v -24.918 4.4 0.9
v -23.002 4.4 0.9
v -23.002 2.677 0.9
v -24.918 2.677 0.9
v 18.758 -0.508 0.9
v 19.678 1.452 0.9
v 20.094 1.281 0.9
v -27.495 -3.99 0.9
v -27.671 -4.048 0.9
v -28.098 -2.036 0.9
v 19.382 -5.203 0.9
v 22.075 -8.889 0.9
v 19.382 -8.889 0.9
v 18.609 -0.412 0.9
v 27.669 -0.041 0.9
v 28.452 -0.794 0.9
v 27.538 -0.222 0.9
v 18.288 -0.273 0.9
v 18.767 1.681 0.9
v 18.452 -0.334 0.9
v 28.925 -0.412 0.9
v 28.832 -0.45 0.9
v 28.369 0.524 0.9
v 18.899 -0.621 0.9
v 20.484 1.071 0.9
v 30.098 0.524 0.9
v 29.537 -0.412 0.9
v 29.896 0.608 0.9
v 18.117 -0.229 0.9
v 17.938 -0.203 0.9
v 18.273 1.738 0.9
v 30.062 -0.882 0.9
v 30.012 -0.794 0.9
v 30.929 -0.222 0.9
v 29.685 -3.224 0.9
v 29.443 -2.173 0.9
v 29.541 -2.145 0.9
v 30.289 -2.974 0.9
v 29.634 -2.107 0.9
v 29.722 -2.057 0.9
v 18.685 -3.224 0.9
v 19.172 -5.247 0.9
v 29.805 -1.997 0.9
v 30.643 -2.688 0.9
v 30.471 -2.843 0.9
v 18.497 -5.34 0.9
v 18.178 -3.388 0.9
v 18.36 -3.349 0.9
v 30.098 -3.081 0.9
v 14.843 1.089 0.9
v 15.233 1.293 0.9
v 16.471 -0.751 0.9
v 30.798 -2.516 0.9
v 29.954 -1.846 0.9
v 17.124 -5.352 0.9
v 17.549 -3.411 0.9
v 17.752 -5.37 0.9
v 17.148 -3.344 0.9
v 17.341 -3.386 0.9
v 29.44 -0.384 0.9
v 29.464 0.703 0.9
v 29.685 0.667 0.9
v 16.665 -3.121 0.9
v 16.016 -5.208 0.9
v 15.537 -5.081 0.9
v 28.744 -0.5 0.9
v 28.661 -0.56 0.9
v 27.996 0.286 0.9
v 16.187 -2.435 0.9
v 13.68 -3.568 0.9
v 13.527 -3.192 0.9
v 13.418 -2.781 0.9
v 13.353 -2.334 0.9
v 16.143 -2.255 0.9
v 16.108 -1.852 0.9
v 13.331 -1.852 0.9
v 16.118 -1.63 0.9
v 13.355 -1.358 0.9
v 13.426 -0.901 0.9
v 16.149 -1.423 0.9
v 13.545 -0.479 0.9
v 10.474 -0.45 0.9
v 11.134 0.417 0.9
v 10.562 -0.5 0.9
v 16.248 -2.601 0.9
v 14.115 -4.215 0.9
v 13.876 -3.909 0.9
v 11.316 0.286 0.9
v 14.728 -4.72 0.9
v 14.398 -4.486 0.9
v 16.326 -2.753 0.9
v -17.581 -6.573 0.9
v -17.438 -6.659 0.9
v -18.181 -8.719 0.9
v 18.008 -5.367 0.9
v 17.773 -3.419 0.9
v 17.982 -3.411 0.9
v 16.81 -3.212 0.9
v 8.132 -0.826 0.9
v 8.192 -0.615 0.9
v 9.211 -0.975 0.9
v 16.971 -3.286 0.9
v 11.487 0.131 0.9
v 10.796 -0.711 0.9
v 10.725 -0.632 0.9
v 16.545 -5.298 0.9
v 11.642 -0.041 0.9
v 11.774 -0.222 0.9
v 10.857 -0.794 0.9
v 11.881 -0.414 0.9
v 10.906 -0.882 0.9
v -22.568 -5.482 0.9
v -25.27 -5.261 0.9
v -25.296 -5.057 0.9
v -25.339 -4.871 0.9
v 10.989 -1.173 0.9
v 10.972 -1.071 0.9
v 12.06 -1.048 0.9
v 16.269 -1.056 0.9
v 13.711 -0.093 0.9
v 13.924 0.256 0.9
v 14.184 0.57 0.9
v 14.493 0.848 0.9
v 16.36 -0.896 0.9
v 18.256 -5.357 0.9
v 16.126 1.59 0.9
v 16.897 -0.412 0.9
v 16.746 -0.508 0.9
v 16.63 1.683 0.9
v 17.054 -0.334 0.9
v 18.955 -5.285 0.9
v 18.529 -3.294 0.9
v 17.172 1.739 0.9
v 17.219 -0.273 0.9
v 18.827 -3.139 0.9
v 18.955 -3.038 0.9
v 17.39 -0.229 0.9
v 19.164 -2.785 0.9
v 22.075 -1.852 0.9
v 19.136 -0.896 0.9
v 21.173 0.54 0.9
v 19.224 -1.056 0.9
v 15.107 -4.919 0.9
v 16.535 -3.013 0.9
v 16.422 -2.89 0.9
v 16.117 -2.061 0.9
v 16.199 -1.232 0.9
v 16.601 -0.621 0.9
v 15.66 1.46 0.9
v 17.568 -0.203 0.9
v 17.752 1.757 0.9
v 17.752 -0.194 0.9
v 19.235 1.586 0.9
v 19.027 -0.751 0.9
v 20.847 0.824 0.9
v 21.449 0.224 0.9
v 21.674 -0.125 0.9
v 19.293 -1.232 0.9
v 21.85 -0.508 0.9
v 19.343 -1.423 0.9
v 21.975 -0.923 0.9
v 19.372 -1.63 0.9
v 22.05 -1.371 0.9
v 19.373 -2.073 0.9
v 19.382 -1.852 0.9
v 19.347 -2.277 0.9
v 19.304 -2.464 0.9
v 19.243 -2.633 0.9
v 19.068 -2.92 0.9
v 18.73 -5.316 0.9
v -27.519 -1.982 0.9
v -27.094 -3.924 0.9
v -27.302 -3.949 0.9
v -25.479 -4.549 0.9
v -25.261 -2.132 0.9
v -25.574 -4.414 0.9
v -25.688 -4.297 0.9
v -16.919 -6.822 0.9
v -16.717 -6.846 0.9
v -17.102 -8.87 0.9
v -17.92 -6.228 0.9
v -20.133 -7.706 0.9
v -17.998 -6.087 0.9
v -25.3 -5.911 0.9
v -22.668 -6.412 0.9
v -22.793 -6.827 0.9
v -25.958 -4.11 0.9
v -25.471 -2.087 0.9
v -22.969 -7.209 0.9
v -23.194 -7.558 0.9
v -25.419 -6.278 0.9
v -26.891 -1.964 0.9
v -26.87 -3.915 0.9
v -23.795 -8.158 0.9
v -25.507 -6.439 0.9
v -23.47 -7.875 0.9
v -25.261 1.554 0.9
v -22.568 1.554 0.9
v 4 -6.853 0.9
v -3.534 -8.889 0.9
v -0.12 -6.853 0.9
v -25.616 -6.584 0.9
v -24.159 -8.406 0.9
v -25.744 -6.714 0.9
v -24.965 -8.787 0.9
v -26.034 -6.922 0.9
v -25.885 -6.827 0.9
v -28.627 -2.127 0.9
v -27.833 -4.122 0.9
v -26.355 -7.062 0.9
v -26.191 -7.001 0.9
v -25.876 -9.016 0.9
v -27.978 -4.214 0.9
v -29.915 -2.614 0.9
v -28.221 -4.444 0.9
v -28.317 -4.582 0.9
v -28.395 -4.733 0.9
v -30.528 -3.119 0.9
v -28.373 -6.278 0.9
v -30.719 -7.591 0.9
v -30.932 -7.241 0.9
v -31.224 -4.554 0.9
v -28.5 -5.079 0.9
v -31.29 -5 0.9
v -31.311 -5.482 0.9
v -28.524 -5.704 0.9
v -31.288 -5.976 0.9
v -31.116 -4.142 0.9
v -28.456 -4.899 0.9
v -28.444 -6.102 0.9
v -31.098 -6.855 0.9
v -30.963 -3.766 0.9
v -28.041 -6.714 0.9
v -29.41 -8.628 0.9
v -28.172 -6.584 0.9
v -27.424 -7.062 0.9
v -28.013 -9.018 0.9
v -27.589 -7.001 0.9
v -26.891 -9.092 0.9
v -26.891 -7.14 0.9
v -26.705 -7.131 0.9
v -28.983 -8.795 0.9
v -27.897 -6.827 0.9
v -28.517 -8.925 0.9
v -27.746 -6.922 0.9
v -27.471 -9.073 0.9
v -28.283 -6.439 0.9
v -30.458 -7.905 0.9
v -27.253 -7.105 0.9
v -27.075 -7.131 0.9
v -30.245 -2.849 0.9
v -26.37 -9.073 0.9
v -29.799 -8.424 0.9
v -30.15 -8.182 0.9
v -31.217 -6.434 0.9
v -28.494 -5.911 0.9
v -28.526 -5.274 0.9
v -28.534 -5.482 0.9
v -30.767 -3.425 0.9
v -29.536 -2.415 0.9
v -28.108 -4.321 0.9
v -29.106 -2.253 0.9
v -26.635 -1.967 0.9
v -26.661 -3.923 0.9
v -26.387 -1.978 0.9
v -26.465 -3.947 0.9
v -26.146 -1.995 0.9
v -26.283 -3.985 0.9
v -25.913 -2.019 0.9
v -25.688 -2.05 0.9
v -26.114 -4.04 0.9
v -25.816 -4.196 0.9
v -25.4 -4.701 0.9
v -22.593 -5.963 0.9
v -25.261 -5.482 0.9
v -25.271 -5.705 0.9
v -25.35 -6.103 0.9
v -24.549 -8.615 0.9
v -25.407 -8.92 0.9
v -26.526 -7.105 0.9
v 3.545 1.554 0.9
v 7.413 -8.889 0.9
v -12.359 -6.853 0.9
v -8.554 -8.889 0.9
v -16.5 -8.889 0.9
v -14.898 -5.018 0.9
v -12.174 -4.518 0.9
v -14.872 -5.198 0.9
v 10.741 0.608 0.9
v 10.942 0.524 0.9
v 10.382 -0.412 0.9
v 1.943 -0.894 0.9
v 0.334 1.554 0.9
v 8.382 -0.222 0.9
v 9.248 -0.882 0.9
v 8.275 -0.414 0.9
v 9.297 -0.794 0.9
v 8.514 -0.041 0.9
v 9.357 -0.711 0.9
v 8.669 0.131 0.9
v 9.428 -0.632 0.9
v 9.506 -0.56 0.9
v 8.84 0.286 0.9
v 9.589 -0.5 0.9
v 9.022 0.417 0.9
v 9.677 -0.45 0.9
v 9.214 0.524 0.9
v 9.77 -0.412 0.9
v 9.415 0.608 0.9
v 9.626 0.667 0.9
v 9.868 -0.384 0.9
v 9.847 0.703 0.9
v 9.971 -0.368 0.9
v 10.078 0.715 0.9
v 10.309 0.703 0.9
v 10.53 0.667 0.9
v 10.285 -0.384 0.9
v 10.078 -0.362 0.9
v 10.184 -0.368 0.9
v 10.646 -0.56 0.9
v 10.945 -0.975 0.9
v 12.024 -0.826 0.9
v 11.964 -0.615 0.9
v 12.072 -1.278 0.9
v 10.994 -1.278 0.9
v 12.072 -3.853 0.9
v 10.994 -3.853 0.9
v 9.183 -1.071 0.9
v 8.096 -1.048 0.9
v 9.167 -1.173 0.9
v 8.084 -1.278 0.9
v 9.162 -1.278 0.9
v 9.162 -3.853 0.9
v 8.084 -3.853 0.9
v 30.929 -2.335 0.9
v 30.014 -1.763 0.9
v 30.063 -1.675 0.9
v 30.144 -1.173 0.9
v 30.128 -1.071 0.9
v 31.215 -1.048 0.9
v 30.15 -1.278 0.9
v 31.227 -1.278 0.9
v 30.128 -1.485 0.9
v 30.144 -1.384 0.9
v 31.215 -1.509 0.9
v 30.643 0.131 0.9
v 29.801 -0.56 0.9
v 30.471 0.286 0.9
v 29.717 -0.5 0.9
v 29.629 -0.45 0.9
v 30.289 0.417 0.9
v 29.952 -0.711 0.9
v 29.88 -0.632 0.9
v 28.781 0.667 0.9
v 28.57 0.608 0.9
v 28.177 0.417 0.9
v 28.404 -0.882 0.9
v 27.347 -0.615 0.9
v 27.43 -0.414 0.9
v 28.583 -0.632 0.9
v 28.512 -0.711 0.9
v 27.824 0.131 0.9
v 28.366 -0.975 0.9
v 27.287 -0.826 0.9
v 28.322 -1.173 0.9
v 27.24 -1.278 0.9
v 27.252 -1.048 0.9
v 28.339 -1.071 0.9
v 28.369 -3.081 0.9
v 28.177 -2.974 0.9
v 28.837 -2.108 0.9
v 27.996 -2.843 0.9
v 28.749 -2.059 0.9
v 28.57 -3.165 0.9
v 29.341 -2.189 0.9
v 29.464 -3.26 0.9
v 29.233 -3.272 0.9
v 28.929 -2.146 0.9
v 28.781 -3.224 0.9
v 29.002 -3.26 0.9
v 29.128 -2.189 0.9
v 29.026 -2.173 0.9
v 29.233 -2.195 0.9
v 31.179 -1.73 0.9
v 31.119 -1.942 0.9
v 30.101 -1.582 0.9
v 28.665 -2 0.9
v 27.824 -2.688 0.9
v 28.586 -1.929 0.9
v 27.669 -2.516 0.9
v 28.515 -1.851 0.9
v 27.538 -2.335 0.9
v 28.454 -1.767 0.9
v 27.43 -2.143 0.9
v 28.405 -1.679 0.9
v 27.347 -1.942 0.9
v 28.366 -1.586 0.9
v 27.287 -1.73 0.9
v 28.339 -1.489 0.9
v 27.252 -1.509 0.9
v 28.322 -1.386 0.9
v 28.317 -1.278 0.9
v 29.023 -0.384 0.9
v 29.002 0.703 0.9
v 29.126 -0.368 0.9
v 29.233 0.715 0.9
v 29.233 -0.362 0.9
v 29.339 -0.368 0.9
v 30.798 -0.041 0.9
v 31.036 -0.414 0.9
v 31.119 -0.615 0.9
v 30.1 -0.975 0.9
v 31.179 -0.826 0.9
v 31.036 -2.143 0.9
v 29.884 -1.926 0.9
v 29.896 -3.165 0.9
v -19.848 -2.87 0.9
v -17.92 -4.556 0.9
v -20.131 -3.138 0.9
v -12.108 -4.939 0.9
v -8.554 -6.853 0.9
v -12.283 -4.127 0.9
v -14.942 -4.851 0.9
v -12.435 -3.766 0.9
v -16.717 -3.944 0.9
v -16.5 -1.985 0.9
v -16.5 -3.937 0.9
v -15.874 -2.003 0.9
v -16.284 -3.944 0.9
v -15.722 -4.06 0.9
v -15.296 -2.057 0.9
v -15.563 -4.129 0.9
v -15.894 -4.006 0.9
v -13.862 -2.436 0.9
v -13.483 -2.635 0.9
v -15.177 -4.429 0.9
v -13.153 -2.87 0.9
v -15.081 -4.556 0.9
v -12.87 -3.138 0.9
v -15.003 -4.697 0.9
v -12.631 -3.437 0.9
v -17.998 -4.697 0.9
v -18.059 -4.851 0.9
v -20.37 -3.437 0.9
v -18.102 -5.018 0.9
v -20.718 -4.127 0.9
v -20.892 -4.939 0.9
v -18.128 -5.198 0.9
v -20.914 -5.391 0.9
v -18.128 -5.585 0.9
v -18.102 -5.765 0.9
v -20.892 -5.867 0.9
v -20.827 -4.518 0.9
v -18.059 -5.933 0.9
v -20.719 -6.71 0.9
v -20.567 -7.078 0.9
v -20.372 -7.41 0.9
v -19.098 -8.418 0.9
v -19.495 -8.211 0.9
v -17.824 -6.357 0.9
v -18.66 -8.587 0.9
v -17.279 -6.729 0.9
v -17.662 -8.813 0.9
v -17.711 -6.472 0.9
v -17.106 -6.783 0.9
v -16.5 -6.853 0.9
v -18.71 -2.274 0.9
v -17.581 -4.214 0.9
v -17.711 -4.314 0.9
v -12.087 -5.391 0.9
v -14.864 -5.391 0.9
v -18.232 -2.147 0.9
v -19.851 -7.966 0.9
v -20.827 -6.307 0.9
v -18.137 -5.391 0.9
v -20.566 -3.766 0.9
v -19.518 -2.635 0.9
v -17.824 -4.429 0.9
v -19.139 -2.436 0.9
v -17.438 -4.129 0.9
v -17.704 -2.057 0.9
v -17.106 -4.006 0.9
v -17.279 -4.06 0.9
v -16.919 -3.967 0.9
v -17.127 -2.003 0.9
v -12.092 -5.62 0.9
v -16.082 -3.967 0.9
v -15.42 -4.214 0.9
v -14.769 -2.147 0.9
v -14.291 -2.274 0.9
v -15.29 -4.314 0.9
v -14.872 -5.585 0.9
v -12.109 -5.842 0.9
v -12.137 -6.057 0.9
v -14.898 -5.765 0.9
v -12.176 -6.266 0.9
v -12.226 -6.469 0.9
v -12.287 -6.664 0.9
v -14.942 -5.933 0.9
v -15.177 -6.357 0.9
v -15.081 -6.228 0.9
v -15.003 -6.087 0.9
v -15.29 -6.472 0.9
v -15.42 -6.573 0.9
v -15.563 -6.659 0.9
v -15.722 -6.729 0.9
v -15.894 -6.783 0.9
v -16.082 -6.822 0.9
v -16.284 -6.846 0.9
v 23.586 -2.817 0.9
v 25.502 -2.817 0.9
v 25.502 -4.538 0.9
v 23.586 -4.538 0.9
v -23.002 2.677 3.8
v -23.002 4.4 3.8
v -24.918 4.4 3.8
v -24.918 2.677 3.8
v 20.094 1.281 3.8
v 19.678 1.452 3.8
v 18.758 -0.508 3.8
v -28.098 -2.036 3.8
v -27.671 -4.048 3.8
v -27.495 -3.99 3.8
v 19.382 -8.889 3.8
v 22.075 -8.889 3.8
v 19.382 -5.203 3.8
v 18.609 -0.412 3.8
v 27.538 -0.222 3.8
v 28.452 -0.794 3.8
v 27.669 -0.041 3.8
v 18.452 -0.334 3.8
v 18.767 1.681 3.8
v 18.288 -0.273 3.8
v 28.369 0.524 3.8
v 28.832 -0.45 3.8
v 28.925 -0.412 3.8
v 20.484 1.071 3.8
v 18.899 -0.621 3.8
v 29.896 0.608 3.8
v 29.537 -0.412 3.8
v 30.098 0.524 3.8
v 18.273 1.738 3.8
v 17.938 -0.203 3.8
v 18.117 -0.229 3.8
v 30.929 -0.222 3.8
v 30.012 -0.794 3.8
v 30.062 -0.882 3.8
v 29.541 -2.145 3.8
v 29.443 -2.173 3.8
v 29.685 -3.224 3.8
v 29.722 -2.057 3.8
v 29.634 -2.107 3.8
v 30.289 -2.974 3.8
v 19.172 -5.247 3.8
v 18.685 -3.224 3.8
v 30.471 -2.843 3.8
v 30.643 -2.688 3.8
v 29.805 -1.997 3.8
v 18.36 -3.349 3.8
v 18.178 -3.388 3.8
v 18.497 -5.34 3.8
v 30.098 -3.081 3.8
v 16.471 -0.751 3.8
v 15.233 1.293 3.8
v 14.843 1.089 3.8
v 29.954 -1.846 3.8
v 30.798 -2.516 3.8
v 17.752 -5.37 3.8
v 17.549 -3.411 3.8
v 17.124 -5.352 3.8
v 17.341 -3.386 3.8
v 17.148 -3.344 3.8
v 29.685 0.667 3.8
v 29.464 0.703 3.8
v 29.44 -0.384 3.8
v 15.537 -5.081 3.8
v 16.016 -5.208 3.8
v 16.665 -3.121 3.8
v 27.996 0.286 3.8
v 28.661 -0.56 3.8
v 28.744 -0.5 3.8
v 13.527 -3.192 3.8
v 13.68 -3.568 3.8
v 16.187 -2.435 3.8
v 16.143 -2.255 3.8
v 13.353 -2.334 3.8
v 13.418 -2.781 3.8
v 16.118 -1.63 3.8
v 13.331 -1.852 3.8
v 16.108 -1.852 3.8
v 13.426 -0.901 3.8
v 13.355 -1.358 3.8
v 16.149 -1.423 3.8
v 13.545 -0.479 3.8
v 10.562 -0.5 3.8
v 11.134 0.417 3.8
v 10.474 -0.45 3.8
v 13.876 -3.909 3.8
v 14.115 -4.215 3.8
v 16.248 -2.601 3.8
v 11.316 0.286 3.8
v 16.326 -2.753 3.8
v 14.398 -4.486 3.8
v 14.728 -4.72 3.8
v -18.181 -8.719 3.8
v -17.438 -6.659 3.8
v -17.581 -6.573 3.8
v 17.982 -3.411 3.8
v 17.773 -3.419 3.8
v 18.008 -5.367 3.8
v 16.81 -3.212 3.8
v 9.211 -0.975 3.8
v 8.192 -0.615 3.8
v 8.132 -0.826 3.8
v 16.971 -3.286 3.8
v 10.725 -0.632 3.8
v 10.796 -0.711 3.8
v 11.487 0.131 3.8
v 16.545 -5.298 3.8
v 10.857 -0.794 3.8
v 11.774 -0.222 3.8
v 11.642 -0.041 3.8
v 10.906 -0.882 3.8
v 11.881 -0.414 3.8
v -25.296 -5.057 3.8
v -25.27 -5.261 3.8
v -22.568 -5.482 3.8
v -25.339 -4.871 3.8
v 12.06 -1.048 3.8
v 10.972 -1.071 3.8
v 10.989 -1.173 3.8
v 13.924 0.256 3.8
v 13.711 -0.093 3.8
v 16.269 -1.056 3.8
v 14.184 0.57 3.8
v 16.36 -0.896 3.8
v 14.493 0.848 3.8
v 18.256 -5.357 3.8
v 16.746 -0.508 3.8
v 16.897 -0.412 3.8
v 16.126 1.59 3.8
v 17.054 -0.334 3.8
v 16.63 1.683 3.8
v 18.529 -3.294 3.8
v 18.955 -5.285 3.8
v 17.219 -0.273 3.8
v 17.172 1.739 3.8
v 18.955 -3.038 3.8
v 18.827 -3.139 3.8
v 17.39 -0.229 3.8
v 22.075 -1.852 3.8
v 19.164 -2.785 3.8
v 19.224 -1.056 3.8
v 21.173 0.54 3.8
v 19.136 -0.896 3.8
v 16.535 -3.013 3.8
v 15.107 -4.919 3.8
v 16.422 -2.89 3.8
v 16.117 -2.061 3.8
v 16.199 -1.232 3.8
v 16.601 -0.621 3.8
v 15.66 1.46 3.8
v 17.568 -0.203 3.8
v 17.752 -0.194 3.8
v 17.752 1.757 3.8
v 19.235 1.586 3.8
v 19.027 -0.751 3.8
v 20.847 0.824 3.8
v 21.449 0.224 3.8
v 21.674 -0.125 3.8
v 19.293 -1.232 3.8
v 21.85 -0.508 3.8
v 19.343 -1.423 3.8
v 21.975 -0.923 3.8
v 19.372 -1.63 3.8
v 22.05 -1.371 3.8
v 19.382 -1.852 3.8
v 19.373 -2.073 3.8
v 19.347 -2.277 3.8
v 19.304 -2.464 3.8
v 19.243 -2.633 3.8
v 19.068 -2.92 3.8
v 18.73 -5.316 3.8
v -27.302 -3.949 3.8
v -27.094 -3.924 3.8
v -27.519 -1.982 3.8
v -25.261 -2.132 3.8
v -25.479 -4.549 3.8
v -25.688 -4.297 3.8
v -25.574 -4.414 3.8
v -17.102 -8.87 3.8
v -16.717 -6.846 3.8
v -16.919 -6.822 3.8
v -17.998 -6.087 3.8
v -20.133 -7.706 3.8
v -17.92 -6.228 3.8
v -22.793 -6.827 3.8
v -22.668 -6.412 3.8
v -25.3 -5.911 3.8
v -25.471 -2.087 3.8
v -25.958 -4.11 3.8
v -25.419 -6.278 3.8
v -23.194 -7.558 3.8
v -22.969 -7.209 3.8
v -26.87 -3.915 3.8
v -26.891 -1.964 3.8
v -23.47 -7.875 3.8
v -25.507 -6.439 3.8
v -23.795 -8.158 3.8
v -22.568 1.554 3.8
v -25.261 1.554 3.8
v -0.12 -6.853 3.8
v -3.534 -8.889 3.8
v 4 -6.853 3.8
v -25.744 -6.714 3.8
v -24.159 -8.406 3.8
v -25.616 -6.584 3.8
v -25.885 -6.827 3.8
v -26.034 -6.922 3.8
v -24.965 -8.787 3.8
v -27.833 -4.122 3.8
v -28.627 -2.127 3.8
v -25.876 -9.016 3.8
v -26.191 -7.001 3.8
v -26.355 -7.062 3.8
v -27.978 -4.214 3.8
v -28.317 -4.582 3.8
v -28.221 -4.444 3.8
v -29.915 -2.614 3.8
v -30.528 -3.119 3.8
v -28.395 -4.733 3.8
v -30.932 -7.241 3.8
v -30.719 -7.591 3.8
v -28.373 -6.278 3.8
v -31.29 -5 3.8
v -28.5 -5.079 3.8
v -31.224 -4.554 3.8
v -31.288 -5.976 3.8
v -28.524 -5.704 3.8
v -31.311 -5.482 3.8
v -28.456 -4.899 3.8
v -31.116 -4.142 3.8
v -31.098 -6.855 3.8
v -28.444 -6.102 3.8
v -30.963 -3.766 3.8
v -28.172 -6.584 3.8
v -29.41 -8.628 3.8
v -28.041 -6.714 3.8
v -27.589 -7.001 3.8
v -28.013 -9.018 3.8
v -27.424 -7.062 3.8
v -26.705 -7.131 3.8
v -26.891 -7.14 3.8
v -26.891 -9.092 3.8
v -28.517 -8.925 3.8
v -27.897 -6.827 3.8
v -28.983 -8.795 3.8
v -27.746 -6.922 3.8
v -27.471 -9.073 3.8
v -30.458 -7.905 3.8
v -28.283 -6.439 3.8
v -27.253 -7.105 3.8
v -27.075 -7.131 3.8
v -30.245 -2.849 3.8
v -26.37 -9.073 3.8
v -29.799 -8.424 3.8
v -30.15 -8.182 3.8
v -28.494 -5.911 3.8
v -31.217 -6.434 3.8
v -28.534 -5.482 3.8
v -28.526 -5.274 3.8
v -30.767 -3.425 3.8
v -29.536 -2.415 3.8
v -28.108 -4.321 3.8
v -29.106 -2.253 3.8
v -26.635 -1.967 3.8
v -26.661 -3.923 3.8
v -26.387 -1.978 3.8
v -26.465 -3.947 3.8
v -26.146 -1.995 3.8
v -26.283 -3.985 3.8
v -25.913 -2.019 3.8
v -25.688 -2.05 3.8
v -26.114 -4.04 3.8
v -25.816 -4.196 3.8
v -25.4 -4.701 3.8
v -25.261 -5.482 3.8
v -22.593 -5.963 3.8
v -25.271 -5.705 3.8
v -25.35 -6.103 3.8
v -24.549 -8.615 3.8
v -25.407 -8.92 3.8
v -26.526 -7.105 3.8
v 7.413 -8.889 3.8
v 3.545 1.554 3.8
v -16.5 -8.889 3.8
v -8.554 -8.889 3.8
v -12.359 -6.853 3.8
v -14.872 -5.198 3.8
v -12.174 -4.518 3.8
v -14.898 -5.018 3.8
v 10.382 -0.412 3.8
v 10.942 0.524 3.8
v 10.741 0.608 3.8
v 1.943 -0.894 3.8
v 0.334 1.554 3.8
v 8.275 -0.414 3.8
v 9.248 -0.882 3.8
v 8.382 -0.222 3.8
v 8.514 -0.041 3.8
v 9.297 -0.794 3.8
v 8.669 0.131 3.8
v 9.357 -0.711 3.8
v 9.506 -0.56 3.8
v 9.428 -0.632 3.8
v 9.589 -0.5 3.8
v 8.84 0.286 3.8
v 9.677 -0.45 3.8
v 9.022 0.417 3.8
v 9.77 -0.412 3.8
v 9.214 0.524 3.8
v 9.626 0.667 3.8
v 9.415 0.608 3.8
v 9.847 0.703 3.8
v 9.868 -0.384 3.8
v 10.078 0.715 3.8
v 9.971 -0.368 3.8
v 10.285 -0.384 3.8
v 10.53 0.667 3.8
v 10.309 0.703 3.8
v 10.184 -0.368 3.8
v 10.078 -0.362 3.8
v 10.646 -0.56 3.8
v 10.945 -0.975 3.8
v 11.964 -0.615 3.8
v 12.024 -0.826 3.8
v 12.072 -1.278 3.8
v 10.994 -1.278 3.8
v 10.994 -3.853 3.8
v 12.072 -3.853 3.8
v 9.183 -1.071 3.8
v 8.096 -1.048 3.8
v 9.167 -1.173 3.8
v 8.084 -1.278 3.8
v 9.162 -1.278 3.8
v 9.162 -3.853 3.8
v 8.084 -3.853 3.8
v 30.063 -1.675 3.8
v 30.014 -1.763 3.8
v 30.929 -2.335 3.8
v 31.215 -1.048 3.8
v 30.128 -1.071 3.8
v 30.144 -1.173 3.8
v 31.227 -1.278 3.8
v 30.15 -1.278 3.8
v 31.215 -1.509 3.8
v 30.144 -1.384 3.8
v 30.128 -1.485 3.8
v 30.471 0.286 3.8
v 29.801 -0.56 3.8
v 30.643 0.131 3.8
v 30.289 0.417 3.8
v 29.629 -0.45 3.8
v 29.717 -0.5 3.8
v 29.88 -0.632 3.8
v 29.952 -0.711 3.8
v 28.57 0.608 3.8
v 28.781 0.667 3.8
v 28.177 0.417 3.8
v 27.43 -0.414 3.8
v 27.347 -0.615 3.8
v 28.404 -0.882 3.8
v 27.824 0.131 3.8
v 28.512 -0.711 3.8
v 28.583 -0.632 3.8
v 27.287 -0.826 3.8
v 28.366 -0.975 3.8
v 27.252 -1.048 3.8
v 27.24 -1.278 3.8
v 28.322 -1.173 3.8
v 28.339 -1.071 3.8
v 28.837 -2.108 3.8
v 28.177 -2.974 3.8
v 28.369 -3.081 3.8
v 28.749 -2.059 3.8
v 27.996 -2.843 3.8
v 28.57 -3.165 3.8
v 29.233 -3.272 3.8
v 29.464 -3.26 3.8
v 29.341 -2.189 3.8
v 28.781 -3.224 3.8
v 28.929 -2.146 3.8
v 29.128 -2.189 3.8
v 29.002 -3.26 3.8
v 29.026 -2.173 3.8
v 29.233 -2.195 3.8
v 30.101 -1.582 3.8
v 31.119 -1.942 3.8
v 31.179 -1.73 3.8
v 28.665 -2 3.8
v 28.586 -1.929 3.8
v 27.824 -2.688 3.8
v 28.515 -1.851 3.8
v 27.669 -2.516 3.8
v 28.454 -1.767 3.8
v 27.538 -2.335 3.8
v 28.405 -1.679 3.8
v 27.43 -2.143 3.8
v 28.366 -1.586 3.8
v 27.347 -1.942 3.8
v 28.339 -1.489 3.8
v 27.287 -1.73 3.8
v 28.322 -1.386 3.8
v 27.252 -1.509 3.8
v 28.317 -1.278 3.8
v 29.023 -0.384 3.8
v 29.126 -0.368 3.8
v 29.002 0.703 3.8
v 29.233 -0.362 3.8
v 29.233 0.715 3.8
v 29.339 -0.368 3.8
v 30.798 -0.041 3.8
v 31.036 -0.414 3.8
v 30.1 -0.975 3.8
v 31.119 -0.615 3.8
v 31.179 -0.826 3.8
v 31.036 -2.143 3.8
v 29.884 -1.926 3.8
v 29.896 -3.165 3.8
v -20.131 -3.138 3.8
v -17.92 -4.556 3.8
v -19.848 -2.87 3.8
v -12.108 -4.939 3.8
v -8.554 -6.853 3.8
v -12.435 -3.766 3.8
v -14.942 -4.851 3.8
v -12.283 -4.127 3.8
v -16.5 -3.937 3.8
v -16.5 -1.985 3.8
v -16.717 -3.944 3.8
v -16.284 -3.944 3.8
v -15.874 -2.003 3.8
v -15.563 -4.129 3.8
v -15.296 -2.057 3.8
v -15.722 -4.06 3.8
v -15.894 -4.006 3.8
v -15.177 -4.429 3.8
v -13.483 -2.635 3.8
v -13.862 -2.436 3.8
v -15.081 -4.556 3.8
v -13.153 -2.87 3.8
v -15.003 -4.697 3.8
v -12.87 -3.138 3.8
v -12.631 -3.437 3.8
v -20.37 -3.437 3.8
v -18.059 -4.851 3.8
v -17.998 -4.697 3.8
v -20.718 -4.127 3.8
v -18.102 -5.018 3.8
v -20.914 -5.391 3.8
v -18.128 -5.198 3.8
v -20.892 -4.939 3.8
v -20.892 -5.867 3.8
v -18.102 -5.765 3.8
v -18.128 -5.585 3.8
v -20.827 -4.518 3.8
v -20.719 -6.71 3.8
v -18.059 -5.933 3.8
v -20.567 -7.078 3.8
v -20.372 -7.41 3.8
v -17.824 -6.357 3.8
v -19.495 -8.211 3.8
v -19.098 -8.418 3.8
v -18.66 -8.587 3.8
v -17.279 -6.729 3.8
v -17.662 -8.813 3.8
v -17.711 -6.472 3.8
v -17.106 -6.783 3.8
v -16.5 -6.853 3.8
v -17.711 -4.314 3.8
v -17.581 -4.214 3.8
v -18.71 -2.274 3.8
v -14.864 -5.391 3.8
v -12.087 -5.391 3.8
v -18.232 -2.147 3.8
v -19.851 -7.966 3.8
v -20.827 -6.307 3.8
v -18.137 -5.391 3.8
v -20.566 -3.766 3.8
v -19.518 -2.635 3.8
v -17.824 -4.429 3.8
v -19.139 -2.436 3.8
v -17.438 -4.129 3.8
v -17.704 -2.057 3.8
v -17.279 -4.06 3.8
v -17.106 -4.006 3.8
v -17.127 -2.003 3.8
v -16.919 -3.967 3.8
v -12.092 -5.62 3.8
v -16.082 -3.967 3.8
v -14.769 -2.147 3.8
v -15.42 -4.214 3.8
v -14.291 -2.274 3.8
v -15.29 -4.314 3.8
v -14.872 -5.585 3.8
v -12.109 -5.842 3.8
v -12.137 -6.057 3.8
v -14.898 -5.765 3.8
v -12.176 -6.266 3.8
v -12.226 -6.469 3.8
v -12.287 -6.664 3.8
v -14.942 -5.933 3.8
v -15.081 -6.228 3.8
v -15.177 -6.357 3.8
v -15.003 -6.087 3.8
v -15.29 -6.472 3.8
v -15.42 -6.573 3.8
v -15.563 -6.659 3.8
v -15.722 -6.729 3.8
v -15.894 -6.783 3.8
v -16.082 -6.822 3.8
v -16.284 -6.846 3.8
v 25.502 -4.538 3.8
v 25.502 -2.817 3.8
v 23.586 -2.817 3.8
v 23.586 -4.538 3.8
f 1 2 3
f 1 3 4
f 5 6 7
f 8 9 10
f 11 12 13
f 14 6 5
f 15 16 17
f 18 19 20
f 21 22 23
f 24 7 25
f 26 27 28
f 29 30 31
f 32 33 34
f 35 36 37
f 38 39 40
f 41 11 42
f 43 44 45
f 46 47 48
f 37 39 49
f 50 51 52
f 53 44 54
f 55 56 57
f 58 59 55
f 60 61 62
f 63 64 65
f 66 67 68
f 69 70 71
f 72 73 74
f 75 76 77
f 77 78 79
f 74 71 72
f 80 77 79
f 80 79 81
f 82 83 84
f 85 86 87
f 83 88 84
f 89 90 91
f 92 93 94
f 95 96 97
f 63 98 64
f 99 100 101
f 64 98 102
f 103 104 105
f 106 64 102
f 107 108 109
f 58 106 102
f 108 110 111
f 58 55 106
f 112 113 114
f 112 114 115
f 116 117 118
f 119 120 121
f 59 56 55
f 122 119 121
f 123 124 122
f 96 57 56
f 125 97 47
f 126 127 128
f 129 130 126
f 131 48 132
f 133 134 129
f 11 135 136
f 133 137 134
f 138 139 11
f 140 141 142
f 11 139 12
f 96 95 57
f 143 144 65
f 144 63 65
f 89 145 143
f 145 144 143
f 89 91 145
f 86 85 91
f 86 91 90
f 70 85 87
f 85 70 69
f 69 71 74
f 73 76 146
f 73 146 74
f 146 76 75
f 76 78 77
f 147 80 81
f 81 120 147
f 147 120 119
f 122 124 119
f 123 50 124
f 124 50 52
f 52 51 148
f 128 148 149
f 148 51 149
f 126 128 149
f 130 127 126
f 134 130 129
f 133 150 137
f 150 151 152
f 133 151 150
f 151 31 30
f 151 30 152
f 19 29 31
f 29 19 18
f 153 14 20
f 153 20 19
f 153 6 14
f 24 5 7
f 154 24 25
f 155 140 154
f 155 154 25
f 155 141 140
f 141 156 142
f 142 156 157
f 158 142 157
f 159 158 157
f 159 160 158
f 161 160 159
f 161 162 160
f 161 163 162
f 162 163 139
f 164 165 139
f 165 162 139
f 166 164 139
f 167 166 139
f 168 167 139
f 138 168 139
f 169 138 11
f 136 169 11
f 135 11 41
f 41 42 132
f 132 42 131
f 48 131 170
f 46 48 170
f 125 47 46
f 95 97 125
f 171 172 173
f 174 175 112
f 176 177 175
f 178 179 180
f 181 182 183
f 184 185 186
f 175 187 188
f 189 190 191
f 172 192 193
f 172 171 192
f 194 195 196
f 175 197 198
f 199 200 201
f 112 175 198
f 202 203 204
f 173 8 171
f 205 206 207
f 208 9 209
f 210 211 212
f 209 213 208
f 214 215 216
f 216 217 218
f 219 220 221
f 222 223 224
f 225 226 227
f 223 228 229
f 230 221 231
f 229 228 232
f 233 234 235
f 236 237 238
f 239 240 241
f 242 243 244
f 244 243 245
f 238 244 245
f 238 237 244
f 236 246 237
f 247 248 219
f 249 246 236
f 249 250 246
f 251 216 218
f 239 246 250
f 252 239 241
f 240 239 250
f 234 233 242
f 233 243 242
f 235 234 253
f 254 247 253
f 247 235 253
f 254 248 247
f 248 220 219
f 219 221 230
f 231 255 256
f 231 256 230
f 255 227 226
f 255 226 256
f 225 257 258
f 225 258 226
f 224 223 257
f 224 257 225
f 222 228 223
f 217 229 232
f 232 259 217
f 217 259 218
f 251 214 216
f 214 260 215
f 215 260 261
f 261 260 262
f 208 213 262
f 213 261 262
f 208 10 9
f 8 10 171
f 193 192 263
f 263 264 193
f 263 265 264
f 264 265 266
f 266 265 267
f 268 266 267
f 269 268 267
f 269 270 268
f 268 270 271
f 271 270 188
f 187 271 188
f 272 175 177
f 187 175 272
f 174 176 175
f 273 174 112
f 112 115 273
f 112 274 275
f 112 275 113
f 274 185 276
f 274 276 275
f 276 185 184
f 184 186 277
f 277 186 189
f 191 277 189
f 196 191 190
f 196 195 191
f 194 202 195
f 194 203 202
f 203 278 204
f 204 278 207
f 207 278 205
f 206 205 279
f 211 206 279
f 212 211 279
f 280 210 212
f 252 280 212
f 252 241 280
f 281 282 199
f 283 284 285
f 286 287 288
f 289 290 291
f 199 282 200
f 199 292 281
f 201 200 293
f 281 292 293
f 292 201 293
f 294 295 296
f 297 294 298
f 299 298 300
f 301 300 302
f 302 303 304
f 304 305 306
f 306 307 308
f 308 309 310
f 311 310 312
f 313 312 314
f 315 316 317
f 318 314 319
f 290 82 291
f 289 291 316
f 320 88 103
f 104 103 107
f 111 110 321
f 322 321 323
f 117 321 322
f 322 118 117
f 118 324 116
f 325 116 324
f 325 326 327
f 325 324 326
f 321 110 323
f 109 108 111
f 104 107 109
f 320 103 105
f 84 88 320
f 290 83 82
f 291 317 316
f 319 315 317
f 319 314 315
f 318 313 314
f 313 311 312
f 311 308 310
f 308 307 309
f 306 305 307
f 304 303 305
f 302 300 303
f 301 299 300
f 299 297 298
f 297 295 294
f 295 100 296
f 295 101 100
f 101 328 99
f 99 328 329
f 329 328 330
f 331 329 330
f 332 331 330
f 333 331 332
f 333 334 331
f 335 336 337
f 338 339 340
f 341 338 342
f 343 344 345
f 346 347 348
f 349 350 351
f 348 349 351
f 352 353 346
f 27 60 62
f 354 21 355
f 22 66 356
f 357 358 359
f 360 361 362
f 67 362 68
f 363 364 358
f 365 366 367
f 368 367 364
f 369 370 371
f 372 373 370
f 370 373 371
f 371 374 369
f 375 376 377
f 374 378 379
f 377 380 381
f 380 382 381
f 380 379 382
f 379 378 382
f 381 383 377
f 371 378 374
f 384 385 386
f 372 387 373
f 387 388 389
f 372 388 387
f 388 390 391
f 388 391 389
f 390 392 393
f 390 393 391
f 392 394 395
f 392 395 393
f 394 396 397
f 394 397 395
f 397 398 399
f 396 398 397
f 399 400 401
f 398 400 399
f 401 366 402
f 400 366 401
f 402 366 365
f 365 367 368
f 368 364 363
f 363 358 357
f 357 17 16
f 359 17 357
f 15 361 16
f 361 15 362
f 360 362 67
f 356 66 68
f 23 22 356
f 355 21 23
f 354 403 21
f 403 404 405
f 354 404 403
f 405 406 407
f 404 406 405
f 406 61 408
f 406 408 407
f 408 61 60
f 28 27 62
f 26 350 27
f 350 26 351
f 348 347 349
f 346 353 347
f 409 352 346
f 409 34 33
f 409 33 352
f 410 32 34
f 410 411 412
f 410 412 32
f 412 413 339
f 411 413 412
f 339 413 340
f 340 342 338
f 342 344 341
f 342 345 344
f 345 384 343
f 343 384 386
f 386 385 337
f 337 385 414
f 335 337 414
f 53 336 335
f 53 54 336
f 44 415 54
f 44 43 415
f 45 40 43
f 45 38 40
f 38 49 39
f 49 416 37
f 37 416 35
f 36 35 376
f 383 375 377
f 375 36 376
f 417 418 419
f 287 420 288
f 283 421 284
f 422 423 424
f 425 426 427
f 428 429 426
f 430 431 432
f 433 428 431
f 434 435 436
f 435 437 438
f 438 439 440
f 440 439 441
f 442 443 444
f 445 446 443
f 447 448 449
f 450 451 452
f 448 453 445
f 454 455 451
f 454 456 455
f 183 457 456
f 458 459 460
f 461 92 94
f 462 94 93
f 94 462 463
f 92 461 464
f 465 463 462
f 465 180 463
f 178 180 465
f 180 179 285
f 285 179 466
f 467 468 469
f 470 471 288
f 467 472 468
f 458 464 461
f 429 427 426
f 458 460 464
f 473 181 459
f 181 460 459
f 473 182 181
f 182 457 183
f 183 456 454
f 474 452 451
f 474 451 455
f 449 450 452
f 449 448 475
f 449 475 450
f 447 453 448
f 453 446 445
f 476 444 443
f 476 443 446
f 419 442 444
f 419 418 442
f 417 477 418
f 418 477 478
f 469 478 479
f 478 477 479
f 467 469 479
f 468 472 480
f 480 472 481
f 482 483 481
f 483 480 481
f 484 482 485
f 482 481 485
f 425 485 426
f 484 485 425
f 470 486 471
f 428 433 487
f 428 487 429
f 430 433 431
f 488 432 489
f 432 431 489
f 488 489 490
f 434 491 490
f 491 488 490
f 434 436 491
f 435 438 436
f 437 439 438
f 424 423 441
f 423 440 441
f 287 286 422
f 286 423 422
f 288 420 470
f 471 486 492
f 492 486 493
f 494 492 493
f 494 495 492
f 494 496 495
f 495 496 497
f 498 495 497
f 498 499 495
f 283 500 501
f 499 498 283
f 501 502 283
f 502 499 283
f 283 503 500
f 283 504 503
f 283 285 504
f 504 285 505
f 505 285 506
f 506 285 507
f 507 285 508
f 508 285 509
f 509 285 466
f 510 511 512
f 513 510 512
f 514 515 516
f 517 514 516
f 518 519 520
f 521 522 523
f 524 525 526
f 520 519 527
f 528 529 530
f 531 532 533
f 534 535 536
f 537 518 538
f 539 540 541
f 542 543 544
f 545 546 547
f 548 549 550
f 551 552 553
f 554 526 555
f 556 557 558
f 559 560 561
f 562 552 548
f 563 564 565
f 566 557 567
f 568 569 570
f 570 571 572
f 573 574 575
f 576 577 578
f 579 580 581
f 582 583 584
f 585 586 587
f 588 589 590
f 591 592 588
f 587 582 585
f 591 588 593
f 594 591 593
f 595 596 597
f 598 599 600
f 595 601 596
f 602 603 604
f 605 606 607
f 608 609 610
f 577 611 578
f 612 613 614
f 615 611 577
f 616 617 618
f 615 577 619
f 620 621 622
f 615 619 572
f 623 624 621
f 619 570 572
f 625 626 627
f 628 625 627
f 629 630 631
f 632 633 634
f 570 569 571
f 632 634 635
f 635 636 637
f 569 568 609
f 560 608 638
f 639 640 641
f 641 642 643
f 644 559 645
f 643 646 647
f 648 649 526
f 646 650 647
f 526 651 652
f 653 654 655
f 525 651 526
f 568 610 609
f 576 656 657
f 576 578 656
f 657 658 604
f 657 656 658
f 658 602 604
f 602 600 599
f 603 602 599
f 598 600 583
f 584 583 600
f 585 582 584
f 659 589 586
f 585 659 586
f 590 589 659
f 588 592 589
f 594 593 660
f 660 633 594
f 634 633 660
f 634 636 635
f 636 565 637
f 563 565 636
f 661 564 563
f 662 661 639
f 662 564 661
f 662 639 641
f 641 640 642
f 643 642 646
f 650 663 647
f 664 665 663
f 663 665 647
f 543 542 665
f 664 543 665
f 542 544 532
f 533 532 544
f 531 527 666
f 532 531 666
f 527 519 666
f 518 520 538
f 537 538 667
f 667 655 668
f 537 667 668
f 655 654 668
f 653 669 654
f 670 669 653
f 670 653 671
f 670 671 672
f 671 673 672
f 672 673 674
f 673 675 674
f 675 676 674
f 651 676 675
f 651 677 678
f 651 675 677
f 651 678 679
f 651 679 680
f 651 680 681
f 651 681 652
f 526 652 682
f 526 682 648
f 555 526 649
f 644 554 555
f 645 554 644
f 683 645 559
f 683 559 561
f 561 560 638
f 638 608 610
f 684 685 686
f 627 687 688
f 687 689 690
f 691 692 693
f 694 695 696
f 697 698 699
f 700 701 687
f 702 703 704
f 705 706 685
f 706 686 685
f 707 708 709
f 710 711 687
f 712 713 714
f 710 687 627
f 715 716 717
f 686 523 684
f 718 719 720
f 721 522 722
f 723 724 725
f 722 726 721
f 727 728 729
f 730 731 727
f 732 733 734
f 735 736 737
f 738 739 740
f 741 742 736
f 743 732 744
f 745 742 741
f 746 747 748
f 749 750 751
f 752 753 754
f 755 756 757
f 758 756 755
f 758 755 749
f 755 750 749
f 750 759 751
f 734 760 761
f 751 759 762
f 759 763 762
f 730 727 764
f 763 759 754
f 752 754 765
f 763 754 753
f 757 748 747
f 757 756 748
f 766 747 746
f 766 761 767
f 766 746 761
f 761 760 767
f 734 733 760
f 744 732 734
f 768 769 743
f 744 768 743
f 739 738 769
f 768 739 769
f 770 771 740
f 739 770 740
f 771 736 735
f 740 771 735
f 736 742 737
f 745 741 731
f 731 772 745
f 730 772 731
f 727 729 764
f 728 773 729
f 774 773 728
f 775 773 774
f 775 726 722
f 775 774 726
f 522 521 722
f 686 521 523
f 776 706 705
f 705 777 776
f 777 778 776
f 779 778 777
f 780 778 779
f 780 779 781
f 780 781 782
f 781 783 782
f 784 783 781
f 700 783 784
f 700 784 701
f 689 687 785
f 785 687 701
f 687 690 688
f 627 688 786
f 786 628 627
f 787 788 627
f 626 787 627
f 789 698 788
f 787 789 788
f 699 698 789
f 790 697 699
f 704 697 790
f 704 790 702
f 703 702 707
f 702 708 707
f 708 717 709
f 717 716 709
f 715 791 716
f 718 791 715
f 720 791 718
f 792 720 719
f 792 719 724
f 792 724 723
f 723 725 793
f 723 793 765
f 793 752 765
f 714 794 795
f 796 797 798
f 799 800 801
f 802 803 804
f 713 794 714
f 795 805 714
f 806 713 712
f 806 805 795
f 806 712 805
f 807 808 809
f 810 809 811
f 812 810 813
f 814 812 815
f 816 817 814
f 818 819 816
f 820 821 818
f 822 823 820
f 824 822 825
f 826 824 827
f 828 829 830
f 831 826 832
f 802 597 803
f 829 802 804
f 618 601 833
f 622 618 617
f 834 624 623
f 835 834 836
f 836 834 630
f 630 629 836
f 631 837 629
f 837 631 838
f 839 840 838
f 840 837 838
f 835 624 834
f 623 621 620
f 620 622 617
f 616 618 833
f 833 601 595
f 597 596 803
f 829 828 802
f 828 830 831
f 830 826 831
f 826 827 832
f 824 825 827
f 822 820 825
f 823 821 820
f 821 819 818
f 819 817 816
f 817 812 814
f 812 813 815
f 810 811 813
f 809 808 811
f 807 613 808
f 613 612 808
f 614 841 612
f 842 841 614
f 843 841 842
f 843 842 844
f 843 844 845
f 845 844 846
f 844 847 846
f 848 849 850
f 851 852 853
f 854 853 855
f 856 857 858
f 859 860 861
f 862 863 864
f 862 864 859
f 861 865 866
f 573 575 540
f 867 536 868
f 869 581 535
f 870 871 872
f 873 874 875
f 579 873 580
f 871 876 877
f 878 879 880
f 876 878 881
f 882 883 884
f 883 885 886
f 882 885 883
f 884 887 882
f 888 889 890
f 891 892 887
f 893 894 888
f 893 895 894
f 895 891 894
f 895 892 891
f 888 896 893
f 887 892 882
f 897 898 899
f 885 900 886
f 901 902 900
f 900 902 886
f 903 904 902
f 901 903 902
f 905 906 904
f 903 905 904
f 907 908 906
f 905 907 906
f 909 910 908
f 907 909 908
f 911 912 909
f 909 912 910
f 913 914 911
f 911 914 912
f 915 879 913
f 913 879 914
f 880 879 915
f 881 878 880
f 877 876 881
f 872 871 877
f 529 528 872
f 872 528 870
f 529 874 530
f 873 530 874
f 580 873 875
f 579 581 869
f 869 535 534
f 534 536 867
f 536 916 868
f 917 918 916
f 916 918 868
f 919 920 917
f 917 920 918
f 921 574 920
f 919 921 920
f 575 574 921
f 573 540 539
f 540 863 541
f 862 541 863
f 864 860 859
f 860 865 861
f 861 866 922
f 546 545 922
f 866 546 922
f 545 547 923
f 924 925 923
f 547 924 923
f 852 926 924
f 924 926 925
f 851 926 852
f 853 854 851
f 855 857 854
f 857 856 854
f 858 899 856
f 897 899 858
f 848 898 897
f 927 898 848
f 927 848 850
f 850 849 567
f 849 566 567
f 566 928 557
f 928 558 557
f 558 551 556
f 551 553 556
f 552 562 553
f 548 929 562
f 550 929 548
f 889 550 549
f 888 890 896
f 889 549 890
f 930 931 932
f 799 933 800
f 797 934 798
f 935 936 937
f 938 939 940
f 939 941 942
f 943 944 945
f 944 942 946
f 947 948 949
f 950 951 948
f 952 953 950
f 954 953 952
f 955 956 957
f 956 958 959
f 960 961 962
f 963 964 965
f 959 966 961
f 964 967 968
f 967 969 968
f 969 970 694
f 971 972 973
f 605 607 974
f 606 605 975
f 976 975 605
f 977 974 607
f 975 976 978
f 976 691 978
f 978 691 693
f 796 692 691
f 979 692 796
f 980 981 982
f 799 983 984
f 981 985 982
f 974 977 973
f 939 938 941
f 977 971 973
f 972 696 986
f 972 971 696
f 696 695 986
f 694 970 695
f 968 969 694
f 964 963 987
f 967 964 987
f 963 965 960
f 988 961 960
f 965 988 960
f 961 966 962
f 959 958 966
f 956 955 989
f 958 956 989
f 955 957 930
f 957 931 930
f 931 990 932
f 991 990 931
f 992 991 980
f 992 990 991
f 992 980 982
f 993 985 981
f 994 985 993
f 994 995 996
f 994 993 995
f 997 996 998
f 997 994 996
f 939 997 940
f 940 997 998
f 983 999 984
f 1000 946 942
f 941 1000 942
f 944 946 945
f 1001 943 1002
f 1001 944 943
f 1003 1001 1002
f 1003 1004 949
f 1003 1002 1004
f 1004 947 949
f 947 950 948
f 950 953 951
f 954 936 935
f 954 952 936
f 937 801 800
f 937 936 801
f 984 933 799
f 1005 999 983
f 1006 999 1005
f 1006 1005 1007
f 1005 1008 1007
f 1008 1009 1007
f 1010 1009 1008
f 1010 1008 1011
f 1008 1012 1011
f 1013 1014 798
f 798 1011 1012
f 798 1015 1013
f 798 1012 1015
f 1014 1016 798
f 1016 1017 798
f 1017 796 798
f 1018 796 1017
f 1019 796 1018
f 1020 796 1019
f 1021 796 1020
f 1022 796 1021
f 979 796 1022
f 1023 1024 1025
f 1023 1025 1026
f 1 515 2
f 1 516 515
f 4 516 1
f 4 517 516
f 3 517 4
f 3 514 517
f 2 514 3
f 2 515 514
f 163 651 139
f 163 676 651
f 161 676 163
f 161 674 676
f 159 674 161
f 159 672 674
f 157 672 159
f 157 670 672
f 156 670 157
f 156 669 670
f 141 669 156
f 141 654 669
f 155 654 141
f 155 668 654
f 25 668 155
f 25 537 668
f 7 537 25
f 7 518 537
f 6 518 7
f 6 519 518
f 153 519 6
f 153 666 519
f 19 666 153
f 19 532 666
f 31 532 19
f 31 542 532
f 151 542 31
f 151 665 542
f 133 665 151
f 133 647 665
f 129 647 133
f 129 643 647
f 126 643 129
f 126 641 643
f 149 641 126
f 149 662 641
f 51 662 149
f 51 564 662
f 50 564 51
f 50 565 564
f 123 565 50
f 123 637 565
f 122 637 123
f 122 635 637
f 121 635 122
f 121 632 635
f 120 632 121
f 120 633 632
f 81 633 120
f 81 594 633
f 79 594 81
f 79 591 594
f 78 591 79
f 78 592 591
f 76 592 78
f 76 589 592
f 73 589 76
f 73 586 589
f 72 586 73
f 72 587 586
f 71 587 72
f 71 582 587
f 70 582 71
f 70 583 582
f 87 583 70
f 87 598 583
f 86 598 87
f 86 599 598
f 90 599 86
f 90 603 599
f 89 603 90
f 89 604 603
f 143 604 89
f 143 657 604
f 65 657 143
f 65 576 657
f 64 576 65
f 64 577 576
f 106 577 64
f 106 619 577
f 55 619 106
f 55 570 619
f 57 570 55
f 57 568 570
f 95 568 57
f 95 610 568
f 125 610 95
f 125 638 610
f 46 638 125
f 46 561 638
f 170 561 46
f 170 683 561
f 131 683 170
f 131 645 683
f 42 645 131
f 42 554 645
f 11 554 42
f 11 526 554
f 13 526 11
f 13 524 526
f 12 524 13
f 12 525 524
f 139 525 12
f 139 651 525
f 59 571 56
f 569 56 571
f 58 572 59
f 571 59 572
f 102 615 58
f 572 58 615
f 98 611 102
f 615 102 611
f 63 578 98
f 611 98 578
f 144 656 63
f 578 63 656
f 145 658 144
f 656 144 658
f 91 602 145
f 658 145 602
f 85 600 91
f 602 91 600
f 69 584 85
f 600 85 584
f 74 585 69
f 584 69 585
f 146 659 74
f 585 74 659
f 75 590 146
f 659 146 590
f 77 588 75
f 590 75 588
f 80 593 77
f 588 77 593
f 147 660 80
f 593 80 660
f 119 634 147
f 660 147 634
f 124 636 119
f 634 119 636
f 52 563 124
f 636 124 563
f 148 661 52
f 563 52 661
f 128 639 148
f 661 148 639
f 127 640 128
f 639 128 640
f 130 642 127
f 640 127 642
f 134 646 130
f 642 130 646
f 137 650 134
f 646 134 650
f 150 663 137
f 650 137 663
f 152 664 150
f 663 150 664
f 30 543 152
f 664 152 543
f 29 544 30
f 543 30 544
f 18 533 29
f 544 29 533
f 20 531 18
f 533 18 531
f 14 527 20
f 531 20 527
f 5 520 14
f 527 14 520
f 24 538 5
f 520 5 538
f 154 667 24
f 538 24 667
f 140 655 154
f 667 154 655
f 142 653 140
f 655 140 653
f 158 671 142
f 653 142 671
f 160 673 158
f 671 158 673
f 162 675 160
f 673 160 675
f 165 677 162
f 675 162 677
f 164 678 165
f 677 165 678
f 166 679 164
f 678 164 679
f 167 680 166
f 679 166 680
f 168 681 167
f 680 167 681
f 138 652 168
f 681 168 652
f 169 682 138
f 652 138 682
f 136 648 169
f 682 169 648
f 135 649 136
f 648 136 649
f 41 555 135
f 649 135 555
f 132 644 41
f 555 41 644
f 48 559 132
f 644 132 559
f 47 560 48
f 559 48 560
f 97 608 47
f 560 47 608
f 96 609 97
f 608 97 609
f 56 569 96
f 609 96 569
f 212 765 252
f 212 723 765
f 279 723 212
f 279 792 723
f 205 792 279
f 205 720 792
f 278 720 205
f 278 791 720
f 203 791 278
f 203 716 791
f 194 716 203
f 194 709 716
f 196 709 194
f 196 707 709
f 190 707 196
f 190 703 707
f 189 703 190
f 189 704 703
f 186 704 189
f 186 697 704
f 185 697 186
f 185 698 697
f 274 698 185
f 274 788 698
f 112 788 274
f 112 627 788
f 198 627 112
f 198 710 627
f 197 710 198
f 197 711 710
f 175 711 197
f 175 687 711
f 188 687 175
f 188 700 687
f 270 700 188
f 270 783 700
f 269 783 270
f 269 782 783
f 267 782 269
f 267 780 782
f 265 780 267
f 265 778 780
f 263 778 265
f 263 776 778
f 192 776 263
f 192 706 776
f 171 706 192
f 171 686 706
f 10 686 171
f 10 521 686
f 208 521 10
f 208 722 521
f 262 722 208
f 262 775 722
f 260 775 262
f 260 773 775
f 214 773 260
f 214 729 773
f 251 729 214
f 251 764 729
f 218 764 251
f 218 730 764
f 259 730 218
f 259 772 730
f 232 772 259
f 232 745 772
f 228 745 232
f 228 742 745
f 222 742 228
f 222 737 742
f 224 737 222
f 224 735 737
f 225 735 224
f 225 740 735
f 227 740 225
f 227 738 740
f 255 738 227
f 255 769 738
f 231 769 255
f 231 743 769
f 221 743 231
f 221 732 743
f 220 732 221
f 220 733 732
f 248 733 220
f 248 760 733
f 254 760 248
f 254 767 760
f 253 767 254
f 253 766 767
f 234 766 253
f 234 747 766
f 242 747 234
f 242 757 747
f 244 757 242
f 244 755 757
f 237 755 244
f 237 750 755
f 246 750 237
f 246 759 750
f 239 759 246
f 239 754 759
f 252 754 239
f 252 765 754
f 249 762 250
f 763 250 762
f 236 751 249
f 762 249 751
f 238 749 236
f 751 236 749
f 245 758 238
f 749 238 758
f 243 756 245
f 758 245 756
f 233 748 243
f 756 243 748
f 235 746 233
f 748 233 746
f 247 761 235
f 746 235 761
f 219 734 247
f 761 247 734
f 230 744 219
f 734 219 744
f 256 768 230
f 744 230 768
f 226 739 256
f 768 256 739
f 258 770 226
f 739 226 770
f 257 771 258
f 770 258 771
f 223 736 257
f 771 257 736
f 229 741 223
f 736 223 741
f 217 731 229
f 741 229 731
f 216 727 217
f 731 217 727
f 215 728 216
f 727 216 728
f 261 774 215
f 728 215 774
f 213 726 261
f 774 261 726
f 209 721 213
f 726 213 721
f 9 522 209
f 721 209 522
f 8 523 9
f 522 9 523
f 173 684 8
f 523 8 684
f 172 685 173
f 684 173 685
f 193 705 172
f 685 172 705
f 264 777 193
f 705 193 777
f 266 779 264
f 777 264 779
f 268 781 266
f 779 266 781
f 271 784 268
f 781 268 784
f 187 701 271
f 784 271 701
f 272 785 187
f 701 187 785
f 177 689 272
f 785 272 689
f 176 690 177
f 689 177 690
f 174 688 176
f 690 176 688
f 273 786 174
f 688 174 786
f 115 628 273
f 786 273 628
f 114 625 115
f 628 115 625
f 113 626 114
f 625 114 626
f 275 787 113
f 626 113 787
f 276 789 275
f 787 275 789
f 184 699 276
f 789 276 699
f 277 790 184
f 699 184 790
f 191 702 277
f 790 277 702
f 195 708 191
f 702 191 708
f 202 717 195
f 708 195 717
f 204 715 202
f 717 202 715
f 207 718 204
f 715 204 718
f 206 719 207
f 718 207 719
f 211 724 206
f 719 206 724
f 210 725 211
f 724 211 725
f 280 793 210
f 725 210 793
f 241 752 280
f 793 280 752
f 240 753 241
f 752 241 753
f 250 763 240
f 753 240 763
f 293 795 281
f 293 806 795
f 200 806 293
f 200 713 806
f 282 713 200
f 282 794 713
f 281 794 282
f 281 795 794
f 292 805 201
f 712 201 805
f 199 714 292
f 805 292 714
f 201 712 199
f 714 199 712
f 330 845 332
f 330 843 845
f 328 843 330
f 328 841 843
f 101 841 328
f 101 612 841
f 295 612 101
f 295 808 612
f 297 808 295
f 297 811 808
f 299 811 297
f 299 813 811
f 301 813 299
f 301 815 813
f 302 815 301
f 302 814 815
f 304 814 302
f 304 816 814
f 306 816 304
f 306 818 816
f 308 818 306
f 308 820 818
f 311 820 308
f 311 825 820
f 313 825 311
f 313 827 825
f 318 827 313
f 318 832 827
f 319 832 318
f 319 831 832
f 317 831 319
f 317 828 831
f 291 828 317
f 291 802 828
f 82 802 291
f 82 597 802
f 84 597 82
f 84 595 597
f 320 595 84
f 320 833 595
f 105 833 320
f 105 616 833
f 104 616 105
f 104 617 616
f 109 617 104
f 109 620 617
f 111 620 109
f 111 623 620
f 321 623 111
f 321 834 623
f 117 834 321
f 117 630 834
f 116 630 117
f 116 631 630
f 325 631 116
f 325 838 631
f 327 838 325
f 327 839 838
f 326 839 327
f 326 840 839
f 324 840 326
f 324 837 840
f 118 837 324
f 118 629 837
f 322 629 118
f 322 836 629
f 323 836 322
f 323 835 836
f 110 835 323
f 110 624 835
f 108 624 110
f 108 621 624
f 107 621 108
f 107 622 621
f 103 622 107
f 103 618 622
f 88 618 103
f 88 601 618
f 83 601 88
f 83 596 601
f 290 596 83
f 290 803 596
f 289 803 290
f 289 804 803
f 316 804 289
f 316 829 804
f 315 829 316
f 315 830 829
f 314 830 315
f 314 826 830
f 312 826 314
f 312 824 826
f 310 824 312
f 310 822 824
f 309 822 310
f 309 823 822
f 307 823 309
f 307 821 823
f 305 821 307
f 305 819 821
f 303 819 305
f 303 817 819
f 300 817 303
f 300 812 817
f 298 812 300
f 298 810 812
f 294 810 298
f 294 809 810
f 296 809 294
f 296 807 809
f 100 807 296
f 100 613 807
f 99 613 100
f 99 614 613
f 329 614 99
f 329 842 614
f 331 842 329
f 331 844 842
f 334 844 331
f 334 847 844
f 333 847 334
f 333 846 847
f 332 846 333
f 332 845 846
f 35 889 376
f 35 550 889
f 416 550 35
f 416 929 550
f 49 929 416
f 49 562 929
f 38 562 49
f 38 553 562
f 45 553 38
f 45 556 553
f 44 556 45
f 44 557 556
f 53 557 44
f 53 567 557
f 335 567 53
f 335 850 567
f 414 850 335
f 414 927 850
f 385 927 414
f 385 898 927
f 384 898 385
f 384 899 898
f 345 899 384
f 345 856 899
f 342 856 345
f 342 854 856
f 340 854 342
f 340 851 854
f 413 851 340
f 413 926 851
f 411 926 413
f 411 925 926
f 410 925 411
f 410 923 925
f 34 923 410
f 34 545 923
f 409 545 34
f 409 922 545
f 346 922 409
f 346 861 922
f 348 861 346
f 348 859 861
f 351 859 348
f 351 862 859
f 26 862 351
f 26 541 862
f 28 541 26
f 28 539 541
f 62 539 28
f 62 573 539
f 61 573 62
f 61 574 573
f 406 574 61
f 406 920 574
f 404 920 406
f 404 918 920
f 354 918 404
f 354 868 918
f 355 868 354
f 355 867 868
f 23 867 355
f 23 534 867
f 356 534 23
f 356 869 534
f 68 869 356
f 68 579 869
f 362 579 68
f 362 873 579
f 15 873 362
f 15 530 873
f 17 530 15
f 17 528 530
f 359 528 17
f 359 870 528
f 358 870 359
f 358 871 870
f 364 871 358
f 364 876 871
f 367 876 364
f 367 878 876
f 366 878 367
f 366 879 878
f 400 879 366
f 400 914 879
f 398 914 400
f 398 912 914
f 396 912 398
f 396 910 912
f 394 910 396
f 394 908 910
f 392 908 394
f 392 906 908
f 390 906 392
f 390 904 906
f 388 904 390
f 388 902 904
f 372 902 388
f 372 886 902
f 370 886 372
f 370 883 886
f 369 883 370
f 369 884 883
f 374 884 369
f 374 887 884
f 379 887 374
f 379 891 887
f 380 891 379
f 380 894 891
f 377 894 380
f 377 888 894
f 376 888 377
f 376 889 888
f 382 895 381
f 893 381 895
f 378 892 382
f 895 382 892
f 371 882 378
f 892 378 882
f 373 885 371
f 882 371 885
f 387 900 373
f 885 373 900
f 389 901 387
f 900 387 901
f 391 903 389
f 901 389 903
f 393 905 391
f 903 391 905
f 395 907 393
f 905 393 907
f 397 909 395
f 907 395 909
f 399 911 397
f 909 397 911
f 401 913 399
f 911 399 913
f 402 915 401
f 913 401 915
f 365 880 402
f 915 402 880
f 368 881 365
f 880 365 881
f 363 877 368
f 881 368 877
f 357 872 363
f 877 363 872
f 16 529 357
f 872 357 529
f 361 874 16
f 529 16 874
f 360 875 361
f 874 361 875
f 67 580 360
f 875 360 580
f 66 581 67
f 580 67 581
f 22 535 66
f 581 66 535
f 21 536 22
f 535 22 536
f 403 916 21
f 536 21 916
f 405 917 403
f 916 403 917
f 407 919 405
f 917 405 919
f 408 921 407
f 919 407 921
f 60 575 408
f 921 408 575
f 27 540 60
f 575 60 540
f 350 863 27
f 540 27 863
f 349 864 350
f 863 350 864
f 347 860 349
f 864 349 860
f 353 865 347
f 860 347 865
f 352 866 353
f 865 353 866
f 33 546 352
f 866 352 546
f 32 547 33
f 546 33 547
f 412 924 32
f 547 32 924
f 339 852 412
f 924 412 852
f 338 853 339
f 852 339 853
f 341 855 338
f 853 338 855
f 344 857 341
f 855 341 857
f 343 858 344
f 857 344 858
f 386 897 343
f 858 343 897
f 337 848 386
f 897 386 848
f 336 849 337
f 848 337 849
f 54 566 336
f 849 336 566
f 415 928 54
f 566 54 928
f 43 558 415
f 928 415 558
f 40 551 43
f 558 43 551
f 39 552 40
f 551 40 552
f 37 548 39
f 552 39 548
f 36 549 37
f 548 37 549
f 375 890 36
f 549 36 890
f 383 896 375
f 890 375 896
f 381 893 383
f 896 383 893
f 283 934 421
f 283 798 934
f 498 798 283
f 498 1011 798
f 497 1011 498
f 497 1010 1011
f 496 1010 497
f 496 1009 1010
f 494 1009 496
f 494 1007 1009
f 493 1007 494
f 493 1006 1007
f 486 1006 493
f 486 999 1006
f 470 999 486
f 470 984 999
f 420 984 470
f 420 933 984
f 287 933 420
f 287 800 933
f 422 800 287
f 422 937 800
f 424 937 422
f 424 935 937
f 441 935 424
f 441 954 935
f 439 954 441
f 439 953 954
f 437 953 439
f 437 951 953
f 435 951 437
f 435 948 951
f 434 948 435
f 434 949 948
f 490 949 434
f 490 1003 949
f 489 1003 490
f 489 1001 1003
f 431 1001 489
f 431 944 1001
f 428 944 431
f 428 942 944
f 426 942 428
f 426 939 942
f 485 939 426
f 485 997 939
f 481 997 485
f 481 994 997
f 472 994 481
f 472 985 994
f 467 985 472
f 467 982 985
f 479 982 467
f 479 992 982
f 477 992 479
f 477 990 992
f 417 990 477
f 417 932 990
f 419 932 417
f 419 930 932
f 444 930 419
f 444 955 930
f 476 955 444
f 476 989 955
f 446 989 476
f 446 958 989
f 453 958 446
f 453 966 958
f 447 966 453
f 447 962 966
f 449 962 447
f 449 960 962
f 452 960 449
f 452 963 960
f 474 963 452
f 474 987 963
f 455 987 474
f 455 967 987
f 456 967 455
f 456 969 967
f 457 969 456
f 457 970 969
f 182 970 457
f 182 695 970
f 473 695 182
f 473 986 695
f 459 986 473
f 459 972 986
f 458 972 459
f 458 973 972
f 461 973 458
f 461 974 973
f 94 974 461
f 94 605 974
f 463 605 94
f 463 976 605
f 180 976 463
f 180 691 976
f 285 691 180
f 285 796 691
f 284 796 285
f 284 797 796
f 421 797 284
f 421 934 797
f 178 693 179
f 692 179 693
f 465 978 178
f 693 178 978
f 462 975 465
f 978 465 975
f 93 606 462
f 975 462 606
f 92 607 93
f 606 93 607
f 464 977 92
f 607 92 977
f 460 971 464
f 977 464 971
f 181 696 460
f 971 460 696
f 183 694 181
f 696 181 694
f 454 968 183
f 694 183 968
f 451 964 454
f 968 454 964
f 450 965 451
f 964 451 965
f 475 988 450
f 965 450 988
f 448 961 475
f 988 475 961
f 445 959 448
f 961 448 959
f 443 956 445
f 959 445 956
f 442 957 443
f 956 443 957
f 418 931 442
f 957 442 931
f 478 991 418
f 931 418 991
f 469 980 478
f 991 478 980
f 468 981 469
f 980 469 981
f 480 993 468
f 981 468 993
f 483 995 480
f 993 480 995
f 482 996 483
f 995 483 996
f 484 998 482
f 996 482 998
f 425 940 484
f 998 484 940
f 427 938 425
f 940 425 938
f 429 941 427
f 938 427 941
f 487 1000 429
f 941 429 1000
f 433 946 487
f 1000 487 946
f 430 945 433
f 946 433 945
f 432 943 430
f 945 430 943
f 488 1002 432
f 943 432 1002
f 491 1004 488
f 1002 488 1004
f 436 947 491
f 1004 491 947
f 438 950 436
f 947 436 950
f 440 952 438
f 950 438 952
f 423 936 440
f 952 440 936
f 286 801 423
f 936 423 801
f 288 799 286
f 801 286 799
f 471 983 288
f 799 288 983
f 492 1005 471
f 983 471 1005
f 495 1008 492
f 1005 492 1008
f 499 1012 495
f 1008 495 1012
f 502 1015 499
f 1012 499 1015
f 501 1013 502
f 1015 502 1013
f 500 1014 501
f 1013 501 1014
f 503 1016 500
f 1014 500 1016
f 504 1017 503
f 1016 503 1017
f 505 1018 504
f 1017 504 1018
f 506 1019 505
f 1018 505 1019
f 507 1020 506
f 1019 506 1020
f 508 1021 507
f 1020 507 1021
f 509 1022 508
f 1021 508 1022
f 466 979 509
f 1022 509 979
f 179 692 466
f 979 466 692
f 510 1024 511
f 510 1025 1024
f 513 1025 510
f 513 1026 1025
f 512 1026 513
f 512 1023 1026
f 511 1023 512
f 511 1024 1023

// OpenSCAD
$fn = 48;
  // syllabics (overlaid on icon, tallest)
  translate([0, -2.500, 0.900]) linear_extrude(height=2.900) text("ᑰᓇ ᐃᐢᑵᐤ", size=10.315, halign="center", valign="center", font="Euphemia UCAS:style=Bold");
